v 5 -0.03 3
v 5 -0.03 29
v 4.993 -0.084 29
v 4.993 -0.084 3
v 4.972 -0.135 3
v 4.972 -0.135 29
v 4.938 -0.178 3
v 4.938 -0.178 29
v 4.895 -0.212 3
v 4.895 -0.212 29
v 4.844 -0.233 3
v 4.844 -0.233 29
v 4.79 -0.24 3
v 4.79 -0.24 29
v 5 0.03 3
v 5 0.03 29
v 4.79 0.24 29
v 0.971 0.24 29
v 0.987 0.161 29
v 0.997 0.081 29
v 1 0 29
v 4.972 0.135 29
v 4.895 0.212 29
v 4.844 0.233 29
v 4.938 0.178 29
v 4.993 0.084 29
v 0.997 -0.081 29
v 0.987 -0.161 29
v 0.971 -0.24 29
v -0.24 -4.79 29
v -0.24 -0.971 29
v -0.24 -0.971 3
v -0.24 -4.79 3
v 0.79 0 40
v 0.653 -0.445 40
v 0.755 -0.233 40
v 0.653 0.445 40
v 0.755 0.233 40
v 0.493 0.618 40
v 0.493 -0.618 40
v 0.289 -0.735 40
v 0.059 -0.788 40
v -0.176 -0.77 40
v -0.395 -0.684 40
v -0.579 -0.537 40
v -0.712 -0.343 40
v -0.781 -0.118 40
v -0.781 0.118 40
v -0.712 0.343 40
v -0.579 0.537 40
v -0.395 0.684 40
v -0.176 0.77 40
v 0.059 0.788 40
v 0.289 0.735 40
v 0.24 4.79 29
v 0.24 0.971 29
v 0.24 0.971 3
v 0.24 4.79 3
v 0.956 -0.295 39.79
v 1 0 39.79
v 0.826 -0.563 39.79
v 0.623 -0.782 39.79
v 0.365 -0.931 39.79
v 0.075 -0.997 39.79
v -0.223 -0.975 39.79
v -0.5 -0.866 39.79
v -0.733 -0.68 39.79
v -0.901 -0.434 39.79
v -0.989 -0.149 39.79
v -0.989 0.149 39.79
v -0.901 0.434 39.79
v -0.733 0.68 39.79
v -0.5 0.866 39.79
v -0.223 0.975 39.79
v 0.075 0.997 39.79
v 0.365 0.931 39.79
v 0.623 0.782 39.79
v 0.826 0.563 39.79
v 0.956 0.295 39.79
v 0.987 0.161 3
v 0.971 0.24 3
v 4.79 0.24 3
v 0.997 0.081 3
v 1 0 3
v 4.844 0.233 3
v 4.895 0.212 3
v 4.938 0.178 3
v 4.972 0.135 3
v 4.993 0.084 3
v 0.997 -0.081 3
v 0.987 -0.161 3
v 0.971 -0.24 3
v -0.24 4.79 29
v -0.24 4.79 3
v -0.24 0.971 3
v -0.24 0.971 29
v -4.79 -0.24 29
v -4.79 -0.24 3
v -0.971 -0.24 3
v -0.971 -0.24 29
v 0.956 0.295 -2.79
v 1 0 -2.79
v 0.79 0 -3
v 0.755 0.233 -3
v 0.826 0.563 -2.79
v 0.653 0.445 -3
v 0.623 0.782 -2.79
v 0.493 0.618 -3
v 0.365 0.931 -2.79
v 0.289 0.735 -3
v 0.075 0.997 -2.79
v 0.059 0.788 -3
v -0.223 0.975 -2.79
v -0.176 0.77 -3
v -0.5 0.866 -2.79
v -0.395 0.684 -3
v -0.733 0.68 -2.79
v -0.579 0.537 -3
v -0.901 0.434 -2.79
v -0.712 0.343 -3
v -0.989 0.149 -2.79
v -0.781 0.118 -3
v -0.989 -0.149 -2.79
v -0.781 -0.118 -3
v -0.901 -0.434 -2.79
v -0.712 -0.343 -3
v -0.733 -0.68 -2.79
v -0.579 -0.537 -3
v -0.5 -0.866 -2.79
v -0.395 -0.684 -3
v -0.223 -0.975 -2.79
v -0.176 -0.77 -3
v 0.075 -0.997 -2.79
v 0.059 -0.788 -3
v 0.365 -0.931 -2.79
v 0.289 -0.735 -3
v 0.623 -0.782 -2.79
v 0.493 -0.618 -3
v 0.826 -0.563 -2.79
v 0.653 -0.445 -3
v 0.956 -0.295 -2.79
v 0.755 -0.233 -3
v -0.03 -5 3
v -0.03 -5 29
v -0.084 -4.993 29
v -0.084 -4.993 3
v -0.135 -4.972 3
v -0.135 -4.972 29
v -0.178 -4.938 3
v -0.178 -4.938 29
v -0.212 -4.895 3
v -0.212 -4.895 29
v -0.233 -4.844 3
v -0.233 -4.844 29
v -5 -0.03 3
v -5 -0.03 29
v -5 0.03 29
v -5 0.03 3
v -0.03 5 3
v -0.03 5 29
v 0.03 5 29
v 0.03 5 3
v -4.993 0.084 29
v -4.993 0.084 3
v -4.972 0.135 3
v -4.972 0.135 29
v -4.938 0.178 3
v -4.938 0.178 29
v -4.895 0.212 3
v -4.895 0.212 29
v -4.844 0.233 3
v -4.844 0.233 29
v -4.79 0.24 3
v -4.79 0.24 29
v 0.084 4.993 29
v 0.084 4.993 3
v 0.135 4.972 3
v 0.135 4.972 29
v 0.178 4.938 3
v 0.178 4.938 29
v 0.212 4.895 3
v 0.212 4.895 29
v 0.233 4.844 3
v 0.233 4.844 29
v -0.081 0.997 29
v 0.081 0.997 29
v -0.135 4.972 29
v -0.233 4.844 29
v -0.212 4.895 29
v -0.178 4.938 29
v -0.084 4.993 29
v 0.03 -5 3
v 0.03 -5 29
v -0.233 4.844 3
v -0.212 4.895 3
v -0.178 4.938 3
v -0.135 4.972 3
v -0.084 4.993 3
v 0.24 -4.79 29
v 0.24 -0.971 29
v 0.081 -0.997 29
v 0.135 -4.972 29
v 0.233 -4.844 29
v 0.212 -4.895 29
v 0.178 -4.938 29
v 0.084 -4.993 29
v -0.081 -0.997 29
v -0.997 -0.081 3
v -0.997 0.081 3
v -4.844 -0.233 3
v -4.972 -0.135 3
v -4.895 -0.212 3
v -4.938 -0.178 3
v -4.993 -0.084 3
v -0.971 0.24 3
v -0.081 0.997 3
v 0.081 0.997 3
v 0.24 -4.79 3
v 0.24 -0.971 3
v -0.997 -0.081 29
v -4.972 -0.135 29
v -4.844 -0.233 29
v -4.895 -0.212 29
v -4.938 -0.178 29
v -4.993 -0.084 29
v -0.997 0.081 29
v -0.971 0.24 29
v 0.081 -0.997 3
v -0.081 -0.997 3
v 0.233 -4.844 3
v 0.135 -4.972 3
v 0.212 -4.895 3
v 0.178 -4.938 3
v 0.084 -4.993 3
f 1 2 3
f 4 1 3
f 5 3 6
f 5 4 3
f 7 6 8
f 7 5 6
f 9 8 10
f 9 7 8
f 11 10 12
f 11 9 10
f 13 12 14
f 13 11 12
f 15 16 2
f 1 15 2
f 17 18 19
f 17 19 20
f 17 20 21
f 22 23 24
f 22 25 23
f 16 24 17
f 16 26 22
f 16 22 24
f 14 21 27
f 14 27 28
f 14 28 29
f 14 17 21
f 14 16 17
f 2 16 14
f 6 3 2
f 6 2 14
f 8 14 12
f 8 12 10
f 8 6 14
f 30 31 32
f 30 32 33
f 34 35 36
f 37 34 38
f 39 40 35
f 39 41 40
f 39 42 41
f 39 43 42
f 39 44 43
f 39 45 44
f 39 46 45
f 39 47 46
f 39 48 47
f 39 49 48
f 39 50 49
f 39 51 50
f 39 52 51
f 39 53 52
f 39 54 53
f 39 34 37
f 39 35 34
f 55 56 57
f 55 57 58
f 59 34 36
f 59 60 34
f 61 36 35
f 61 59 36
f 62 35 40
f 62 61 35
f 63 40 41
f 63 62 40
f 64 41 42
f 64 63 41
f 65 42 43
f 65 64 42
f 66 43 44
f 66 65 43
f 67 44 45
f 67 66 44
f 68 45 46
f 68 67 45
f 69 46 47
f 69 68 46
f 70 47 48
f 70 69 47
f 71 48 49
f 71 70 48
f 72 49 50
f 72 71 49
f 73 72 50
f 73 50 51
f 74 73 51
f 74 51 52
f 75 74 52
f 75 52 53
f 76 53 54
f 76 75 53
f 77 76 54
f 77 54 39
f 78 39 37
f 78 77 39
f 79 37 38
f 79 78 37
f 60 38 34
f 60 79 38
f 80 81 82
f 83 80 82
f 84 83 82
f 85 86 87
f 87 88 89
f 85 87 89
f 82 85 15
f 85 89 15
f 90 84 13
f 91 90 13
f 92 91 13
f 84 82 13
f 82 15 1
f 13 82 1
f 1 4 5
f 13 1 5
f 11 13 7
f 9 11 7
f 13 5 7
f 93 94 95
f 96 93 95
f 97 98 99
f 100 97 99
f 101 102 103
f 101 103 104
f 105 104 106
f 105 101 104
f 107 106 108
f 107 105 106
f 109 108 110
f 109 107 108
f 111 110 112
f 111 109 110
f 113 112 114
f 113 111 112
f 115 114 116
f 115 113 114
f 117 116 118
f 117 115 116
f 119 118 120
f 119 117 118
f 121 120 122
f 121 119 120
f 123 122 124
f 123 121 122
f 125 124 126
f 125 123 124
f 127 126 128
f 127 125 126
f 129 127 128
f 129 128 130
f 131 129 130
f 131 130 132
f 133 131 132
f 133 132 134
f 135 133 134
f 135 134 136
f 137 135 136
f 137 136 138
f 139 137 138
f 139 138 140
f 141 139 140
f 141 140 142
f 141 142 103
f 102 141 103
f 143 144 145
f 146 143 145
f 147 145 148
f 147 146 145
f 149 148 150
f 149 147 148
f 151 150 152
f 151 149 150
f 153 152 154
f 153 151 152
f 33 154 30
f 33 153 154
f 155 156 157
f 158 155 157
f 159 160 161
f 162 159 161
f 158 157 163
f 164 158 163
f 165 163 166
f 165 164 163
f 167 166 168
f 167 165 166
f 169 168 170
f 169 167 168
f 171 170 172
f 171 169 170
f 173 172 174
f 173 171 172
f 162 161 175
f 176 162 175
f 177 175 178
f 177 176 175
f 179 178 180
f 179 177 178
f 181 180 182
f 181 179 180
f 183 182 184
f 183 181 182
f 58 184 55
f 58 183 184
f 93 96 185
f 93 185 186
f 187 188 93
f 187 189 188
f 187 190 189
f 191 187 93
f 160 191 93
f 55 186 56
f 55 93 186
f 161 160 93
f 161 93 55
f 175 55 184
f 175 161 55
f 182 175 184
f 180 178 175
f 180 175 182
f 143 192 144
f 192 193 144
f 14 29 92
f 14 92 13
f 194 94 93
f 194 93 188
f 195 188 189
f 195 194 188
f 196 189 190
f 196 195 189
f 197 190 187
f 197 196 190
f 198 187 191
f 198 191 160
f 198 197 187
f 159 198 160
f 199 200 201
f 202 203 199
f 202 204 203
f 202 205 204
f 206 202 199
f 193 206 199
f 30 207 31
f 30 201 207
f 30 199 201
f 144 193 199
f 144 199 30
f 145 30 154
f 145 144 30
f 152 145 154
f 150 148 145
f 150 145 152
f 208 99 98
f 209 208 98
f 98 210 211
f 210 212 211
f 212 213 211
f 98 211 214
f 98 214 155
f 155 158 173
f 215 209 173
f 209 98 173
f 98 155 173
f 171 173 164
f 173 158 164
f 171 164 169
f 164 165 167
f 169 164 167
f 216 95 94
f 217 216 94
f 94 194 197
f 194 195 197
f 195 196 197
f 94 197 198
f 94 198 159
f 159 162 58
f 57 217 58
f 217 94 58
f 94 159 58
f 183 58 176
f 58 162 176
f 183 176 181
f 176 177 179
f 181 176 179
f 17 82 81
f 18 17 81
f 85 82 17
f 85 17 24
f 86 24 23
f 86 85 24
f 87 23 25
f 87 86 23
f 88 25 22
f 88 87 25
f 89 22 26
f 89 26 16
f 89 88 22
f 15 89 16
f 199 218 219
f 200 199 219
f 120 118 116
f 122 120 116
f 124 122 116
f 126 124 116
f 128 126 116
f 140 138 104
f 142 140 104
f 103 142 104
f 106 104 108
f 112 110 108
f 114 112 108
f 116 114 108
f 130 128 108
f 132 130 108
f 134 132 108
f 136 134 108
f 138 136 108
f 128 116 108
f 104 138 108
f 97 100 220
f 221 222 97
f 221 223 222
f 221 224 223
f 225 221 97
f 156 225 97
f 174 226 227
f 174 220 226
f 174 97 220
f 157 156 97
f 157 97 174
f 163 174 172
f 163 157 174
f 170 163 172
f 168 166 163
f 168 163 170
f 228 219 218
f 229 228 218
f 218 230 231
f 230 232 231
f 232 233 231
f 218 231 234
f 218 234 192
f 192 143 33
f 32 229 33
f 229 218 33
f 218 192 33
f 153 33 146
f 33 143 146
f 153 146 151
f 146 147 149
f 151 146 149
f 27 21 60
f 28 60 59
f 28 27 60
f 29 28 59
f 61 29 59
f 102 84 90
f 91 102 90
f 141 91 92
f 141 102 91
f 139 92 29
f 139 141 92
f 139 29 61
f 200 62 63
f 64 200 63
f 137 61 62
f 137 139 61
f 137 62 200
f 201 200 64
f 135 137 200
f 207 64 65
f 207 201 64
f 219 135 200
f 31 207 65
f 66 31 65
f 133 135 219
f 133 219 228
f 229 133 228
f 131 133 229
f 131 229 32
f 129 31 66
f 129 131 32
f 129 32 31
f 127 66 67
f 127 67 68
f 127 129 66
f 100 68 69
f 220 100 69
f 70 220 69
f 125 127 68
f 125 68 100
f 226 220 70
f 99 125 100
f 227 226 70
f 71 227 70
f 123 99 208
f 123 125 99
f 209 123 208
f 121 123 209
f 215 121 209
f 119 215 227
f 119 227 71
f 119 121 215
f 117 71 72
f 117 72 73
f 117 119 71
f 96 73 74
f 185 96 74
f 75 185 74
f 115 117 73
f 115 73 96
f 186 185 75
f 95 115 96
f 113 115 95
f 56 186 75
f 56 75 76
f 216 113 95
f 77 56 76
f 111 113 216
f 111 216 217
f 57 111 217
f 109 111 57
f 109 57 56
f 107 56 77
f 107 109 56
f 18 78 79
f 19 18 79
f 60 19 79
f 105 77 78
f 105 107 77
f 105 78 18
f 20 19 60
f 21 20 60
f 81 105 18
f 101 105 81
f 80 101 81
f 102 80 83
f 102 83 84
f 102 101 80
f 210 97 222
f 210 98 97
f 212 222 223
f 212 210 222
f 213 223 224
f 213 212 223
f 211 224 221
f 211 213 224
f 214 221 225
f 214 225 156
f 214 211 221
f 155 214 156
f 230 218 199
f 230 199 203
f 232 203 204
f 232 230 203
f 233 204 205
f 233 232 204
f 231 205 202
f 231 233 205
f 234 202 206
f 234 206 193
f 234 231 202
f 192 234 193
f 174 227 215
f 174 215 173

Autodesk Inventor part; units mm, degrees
ref_plane "YZ Plane" through (0, 0, 0) normal (1, 0, 0) x (0, 1, 0)
ref_plane "XZ Plane" through (0, 0, 0) normal (0, 1, 0) x (-1, 0, 0)
sketch "Sketch1" plane through (0, 0, 0) normal (0, 0, 1) x (1, 0, 0)
  circle A0 centre (0, 0) radius 1
  dimension "d0" = 2
extrude "Extrusion1" add sketch "Sketch1" along normal blind 40 and the other way blind 3
ref_plane "Work Plane1" through (0, 0, 29) normal (0, 0, 1) x (1, 0, 0)
sketch "Sketch2" plane through (0, 0, 29) normal (0, 0, 1) x (1, 0, 0)
  circle A0 centre (0, 0) radius 1 projected
  line L0 (-0.24, 1) -> (-0.24, 5)
  line L1 (-0.24, 5) -> (0.24, 5)
  line L2 (0.24, 5) -> (0.24, 1)
  circle A1 centre (0, 0) radius 1 projected
  line L3 (-0.24, 1) -> (-0.24, 0.957)
  line L4 (-0.24, 0.957) -> (0.24, 0.957)
  line L5 (0.24, 0.957) -> (0.24, 1)
  dimension "d5" = 4
  dimension "d6" = 0.48
  dimension "d7" = 4
  dimension "d9" = 0.24
  dimension "d10" = 5
  dimension "d11" = 5
extrude "Extrusion2" add sketch "Sketch2" against normal blind 26 contours L5 L4 L3 A0 | A0 L3 L0 L1 L2 L5 picked at (0.0269, 0.9702)
fillet "Fillet1" radius 0.21 2 edges at (0.24, 5, 16) (-0.24, 5, 16)
pattern_circular "Circular Pattern3" count 4 over 360 about axis through (0, 0, -10) along (0, 0, 1)
chamfer "Chamfer1" distance 0.21 angle 45 2 edges at (-1, 0, 40) (-1, 0, -3)
properties part number "fan"
